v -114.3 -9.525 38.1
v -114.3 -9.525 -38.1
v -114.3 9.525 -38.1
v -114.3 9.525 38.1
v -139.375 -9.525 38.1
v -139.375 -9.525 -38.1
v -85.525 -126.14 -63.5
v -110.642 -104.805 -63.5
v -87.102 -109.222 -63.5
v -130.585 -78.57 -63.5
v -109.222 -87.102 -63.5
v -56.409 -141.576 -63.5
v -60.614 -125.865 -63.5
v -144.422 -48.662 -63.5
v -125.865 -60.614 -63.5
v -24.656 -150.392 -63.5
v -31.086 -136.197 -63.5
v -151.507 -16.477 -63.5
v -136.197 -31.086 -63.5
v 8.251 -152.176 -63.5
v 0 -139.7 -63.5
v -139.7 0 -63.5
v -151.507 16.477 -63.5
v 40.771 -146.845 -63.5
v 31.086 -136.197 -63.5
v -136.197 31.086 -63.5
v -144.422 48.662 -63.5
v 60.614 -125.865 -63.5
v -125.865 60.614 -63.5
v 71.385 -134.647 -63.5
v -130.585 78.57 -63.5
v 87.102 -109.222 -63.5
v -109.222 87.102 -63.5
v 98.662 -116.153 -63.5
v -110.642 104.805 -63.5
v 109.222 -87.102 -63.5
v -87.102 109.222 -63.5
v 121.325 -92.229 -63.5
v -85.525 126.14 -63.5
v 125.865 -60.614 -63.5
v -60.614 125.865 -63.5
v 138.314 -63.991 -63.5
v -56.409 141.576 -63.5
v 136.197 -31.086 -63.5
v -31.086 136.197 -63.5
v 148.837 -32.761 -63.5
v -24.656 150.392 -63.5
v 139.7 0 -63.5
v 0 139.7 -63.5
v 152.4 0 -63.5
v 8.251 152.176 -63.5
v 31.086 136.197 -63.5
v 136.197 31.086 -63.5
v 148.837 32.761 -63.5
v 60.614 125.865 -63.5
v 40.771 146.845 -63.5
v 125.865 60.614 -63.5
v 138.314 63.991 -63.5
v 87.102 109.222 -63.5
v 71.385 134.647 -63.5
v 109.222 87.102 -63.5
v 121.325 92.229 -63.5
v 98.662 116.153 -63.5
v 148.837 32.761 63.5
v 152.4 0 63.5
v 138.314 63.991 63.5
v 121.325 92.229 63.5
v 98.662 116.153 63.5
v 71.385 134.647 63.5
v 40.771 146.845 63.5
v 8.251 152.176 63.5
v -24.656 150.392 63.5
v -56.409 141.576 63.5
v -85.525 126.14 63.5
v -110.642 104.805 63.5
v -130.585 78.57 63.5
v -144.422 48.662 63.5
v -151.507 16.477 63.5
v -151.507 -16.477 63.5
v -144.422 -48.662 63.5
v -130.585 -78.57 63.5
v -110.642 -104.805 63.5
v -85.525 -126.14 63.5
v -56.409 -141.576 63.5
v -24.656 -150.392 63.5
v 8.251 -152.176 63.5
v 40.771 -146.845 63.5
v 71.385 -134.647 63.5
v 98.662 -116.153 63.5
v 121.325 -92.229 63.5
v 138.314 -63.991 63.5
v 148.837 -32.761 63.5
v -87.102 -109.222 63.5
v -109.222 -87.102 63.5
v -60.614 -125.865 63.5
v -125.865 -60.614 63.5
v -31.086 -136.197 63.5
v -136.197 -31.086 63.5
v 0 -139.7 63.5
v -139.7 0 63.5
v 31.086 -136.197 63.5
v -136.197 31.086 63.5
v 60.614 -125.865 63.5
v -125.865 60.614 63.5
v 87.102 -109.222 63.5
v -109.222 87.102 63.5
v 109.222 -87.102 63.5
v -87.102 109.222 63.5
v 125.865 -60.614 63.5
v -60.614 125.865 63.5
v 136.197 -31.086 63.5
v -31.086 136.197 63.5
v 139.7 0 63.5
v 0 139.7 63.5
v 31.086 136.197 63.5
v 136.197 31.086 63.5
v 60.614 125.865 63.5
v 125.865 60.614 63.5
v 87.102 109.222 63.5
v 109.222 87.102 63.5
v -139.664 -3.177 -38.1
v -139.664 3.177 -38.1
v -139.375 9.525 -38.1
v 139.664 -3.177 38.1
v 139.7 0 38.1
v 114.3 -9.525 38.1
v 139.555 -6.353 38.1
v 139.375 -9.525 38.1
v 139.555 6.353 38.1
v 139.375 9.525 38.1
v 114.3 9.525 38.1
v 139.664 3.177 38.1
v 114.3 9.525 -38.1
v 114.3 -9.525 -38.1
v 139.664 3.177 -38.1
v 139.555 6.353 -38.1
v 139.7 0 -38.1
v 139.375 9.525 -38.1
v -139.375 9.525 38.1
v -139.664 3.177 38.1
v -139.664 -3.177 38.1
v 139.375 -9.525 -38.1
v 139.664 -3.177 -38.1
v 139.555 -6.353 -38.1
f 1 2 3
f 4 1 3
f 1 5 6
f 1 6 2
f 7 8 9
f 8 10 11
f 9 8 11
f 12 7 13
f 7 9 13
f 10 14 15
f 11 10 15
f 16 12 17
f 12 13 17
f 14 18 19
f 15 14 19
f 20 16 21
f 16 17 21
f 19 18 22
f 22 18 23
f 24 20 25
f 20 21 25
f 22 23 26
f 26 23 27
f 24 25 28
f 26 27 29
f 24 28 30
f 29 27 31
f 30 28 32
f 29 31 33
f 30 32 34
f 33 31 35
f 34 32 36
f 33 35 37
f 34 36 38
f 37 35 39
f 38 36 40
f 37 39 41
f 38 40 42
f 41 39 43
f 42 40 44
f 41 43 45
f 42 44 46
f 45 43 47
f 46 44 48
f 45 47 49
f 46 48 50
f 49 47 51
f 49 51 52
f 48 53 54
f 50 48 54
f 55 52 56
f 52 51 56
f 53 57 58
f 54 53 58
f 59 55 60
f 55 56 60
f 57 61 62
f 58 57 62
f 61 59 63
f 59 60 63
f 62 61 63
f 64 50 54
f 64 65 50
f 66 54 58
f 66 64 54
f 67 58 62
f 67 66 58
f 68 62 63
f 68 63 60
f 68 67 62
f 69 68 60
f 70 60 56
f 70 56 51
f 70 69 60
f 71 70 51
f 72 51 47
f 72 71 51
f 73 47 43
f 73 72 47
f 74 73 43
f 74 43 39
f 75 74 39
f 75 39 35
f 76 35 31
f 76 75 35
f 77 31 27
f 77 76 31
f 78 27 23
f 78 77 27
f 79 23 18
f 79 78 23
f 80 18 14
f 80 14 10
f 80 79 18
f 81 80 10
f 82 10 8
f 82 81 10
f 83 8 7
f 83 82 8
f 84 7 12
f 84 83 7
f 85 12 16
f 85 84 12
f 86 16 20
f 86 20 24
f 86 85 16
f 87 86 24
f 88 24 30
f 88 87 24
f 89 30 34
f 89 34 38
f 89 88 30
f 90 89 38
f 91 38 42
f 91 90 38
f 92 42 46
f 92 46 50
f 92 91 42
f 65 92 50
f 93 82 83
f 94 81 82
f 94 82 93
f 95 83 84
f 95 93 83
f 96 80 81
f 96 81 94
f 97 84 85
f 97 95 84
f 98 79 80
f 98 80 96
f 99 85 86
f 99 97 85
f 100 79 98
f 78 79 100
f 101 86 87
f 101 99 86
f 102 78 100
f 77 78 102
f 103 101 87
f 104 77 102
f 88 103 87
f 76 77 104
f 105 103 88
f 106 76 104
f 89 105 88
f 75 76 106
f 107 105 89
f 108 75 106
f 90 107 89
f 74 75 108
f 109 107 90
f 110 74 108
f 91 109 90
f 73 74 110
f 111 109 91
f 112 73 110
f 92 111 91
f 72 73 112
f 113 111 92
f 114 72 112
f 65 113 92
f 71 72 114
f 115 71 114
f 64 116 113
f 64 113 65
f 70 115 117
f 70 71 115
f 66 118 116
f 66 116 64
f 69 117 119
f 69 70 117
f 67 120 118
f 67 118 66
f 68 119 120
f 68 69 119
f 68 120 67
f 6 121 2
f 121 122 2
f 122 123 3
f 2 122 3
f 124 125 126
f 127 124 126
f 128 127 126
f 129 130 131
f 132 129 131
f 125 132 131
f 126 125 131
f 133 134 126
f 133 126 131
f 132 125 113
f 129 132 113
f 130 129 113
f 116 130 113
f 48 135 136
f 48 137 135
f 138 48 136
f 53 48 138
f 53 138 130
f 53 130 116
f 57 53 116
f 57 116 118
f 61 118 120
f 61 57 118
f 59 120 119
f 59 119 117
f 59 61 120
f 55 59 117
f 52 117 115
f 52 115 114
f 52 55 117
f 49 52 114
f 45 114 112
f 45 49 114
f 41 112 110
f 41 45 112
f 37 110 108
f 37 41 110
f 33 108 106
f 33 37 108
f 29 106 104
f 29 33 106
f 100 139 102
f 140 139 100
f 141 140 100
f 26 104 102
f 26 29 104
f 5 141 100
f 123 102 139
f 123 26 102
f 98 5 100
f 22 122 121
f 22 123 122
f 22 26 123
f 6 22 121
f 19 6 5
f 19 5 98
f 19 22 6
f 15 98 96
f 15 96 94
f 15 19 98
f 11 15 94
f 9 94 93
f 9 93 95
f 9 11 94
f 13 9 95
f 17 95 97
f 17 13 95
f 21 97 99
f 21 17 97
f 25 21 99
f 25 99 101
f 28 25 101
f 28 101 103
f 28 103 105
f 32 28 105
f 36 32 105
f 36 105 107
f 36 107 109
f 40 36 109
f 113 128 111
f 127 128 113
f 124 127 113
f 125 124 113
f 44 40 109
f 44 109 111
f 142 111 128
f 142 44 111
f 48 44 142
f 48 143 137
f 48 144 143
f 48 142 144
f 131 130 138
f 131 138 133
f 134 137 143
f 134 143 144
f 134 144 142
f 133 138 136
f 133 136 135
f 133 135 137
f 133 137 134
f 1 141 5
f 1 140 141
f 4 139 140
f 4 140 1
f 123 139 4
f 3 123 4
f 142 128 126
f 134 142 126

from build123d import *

# Parameters (mm, degrees)
SKETCH1_R           = 152.4
SKETCH1_R_2         = 139.7
BOSS_EXTRUDE1_DEPTH = 63.5
SKETCH2_W           = 34.925
SKETCH2_H           = 19.05
BOSS_EXTRUDE2_DEPTH = 38.1


with BuildPart() as part:
    # Sketch1 → Boss-Extrude1 (new, symmetric)
    with BuildSketch(Plane.XY):
        Circle(SKETCH1_R)
        Circle(SKETCH1_R_2, mode=Mode.SUBTRACT)
    extrude(amount=BOSS_EXTRUDE1_DEPTH, both=True)

    # Sketch2 → Boss-Extrude2 (add, symmetric)
    with BuildSketch(Plane.XY):
        with Locations((-131.7625, 0)):
            Rectangle(SKETCH2_W, SKETCH2_H)
    boss_extrude2 = extrude(amount=BOSS_EXTRUDE2_DEPTH, both=True)

    # Mirror2: Boss-Extrude2 across plane
    add(boss_extrude2.mirror(Plane(origin=(0, 0, 0), x_dir=(0, 0, 1), z_dir=(1, 0, 0))))


solid = part.part
